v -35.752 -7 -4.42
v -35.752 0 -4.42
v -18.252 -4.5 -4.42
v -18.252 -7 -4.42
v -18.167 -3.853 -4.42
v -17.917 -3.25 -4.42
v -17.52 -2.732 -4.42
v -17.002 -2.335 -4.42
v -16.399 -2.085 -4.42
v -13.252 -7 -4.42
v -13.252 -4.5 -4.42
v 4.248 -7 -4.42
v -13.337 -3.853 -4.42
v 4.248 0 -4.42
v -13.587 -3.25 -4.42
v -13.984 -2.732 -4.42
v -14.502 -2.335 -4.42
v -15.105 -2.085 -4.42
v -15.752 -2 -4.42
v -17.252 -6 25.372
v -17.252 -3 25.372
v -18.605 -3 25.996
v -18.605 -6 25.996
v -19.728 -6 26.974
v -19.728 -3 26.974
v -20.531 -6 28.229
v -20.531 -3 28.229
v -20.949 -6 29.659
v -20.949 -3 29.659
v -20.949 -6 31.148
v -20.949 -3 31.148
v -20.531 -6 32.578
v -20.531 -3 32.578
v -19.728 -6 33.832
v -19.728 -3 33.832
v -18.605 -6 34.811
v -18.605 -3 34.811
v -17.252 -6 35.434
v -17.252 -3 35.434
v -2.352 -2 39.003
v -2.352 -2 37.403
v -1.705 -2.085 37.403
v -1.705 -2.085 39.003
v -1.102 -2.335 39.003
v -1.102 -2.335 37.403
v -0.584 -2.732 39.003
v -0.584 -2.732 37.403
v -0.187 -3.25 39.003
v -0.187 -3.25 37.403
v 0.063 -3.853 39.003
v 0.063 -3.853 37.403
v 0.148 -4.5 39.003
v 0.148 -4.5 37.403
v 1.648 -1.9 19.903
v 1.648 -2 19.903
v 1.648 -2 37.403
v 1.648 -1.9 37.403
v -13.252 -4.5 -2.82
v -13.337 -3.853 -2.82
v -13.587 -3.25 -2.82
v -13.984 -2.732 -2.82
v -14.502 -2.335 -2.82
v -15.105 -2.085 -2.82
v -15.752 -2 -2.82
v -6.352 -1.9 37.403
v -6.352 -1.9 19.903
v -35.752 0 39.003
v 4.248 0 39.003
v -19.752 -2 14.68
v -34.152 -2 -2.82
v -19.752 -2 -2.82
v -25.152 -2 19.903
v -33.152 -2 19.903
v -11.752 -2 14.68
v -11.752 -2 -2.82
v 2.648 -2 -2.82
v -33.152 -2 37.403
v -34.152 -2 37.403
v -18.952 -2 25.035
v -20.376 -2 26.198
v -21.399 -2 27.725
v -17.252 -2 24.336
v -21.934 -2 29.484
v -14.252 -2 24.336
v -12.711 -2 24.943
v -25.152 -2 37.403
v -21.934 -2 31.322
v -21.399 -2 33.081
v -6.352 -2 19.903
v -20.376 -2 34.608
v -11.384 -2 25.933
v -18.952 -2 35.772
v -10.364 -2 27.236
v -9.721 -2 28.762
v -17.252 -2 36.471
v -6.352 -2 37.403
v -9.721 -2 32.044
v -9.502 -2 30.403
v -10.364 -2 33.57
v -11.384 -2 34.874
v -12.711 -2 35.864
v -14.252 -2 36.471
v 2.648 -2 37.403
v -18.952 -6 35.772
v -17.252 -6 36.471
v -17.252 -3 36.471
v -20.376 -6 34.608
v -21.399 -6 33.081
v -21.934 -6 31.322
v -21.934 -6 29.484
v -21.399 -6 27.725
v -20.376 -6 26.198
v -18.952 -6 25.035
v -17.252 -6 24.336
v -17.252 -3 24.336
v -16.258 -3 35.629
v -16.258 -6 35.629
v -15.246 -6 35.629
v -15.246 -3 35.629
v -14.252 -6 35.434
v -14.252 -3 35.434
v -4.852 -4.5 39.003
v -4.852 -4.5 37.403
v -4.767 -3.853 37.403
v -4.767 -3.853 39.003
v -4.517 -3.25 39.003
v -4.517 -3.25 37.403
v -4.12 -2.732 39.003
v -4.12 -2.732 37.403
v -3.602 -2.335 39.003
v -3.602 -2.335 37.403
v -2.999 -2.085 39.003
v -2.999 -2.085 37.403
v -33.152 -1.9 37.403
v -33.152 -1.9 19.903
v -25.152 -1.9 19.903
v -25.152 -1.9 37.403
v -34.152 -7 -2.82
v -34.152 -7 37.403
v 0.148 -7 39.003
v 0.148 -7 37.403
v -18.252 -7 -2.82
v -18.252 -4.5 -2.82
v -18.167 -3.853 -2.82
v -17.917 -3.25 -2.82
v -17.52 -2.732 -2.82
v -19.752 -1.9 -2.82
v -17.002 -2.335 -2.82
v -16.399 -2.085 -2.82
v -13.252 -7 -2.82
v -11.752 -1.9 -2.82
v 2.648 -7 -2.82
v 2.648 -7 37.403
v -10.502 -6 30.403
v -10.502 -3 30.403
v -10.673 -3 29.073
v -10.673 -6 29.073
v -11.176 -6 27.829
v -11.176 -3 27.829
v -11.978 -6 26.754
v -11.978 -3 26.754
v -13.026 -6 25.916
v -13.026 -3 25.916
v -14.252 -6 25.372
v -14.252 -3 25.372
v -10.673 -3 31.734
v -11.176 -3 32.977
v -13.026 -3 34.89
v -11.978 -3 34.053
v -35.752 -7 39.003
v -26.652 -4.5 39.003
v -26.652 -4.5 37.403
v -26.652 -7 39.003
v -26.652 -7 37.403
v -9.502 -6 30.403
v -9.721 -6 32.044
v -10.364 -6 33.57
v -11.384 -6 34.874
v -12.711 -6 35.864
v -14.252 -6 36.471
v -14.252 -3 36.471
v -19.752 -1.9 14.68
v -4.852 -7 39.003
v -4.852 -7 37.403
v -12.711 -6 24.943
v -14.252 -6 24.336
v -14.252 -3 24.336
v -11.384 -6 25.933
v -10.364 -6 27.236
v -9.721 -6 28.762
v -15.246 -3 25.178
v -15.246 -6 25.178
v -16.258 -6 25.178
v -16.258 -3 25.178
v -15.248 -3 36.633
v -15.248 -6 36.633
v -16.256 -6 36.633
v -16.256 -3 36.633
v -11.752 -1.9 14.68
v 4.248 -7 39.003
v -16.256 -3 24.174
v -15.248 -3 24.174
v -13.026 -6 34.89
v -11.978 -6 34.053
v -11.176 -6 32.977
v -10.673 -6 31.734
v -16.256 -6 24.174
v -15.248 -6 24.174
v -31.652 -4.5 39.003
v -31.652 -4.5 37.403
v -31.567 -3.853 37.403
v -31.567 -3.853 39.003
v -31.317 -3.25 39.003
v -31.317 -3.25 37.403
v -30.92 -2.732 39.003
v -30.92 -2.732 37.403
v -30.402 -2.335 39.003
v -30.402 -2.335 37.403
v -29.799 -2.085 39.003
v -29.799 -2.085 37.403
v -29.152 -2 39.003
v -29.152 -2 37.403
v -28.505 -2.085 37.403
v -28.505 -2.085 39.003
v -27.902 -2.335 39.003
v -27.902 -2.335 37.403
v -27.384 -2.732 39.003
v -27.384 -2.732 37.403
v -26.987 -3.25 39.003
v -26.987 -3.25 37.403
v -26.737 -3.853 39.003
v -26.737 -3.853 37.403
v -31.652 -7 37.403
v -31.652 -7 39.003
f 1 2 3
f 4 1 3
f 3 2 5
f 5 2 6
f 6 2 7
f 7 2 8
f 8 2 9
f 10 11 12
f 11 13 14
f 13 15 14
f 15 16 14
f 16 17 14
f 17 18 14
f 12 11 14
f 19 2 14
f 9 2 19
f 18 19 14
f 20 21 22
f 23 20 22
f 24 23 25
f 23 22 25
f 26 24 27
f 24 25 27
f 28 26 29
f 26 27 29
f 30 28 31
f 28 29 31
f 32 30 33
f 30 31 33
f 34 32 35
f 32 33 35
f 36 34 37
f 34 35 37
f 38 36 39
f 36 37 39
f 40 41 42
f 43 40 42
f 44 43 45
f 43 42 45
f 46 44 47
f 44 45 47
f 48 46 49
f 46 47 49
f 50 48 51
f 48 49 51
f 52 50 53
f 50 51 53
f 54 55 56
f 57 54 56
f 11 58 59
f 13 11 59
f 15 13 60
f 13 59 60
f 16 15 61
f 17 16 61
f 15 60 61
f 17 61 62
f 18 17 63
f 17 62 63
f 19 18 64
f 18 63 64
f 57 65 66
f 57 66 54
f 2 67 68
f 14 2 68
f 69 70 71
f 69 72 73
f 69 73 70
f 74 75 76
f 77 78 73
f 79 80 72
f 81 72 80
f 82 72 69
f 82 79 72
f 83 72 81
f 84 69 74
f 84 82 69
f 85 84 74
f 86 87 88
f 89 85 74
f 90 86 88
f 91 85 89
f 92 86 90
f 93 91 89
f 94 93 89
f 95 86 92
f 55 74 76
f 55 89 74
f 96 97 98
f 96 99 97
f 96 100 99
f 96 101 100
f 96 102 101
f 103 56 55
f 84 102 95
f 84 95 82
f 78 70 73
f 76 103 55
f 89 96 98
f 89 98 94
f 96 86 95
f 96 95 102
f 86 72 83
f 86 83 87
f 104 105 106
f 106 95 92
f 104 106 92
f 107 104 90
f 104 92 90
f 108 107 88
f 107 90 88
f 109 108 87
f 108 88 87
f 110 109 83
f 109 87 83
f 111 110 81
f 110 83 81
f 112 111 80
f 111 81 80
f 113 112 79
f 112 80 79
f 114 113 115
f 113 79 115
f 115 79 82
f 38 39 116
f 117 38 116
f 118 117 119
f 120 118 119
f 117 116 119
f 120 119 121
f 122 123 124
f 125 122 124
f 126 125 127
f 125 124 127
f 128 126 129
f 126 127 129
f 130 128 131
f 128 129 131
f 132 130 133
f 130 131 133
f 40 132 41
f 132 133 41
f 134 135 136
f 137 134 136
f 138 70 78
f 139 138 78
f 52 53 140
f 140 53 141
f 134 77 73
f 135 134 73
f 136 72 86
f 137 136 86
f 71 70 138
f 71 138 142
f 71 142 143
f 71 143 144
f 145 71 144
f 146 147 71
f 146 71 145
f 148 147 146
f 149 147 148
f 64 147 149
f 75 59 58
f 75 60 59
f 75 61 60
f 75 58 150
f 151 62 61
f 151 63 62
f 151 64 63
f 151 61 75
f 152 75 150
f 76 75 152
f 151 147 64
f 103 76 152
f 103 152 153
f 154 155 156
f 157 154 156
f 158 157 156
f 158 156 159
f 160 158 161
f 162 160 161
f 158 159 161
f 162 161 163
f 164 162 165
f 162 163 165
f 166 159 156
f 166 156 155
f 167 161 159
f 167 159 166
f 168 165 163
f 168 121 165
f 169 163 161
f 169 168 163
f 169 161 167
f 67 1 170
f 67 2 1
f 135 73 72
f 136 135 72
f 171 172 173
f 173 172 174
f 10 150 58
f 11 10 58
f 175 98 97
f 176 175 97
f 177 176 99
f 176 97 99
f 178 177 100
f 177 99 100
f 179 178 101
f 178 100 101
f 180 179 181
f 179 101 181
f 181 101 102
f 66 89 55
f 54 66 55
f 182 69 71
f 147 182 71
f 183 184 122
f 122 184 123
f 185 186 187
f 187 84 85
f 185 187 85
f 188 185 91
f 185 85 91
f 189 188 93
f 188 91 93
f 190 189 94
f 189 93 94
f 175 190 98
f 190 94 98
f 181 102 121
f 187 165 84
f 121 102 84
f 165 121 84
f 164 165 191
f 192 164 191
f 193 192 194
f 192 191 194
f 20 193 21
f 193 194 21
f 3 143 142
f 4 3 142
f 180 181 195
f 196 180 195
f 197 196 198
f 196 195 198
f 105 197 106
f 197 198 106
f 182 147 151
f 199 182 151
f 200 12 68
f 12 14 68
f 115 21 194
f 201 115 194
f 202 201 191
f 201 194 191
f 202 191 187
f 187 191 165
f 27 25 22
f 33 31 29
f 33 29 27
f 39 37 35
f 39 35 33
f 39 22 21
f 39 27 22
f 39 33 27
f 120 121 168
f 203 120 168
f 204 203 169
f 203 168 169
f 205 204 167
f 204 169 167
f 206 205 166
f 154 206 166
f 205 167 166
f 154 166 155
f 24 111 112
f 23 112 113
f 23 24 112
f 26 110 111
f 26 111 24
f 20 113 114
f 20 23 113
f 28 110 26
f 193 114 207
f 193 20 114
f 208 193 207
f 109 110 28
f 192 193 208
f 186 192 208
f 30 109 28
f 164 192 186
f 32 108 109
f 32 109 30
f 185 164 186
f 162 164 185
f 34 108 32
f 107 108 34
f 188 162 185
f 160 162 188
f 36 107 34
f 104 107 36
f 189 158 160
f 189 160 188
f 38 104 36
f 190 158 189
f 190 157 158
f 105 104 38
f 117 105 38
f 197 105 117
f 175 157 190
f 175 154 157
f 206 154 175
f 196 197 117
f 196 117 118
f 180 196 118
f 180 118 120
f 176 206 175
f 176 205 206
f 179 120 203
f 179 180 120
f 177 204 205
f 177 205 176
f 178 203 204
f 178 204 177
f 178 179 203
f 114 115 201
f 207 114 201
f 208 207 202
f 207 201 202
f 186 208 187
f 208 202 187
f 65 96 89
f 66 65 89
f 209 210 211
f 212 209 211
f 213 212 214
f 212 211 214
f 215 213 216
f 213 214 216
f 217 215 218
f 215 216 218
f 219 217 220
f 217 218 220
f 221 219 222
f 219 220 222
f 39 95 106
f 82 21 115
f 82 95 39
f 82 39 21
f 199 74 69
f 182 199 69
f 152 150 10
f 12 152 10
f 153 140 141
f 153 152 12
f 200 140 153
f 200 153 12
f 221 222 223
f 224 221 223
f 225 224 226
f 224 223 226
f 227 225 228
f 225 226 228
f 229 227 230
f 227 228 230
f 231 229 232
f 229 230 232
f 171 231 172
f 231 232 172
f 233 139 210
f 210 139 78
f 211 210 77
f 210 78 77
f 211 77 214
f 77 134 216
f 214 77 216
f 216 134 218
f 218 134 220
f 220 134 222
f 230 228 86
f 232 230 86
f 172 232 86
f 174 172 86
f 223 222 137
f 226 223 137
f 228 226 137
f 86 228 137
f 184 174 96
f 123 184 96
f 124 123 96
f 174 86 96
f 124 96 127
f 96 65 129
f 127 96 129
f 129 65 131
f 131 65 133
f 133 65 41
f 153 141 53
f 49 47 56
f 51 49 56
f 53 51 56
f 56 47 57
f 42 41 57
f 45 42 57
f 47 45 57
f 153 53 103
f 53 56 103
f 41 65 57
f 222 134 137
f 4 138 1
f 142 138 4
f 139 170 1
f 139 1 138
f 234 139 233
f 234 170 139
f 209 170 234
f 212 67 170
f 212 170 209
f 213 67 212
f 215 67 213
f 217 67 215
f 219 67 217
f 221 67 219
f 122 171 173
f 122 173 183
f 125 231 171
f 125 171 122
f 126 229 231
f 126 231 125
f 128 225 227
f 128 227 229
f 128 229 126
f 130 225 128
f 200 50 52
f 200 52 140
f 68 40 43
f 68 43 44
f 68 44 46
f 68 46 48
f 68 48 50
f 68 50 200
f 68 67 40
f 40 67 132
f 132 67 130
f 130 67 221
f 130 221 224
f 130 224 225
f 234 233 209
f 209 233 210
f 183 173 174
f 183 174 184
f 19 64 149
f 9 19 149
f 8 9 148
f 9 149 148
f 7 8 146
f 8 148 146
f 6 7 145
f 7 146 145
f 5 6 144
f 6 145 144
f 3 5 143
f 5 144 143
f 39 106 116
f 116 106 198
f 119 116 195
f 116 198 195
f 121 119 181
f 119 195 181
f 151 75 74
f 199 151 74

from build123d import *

# Parameters (mm, degrees)
F0_W      = 40
F0_H      = 43.4234265382
F1_DEPTH  = 2
F2_W      = 40
F2_H      = 43.4234265382
F2_W_2    = 36.8
F2_H_2    = 40.2234265382
F3_DEPTH  = 5
F5_DEPTH  = 1.6
F7_DEPTH  = 1
F8_DEPTH  = 4
F9_DEPTH  = 1
F11_DEPTH = 1.6
F13_DEPTH = 0.1


with BuildPart() as f1:
    # F0 (on Front) → F1 (new body)
    with BuildSketch(Plane.XZ):
        with Locations((-15.7519546337, 17.2915523872)):
            Rectangle(F0_W, F0_H)
    extrude(amount=F1_DEPTH)

    # F2 (on face) → F3 (join)
    with BuildSketch(Plane.XZ.offset(2)):
        with Locations((-15.7519546337, 17.2915523872)):
            Rectangle(F2_W, F2_H)
        with Locations((-15.7519546337, 17.2915523872)):
            Rectangle(F2_W_2, F2_H_2, mode=Mode.SUBTRACT)
    extrude(amount=F3_DEPTH)

    # F4 (on face) → F5 (cut, through all)
    with BuildSketch(Plane(origin=(0, 0, 37.4032656563), x_dir=(1, 0, 0), z_dir=(0, 0, -1))):
        with BuildLine():
            ThreePointArc((-4.8519546337, 4.5), (-4.1197215867, 2.732233047), (-2.3519546337, 2))
            ThreePointArc((-2.3519546337, 2), (-0.5841876808, 2.732233047), (0.1480453663, 4.5))
            ThreePointArc((0.1480453663, 4.5), (-0.5841876808, 6.267766953), (-2.3519546337, 7))
            ThreePointArc((-2.3519546337, 7), (-4.1197215867, 6.267766953), (-4.8519546337, 4.5))
        make_face()
        with BuildLine():
            ThreePointArc((-29.1519546337, 2), (-27.3841876808, 2.732233047), (-26.6519546337, 4.5))
            ThreePointArc((-26.6519546337, 4.5), (-27.3841876808, 6.267766953), (-29.1519546337, 7))
            ThreePointArc((-29.1519546337, 7), (-30.9197215867, 6.267766953), (-31.6519546337, 4.5))
            ThreePointArc((-31.6519546337, 4.5), (-30.9197215867, 2.732233047), (-29.1519546337, 2))
        make_face()
        with BuildLine():
            ThreePointArc((-29.1519546337, 7), (-27.3841876808, 6.267766953), (-26.6519546337, 4.5))
            Line((-26.6519546337, 4.5), (-26.6519546337, 7))
            Line((-26.6519546337, 7), (-29.1519546337, 7))
        make_face()
        with BuildLine():
            ThreePointArc((-31.6519546337, 4.5), (-30.9197215867, 6.267766953), (-29.1519546337, 7))
            Line((-29.1519546337, 7), (-31.6519546337, 7))
            Line((-31.6519546337, 7), (-31.6519546337, 4.5))
        make_face()
        with BuildLine():
            Line((-2.3519546337, 7), (-4.8519546337, 7))
            Line((-4.8519546337, 7), (-4.8519546337, 4.5))
            ThreePointArc((-4.8519546337, 4.5), (-4.1197215867, 6.267766953), (-2.3519546337, 7))
        make_face()
        with BuildLine():
            ThreePointArc((-2.3519546337, 7), (-0.5841876808, 6.267766953), (0.1480453663, 4.5))
            Line((0.1480453663, 4.5), (0.1480453663, 7))
            Line((0.1480453663, 7), (-2.3519546337, 7))
        make_face()
    extrude(amount=-F5_DEPTH, mode=Mode.SUBTRACT)

    # F6 (on face) → F7 (join)
    with BuildSketch(Plane.XZ.offset(2)):
        with BuildLine():
            Line((-17.2519546337, 25.3721127069), (-17.2519546337, 35.4344186057))
            ThreePointArc((-17.2519546337, 35.4344186057), (-21.0019546337, 30.4032656563), (-17.2519546337, 25.3721127069))
        make_face()
        with BuildLine():
            ThreePointArc((-14.2519546337, 25.3721127069), (-11.5425900736, 27.2657905568), (-10.5019546337, 30.4032656563))
            ThreePointArc((-10.5019546337, 30.4032656563), (-11.5425900736, 33.5407407558), (-14.2519546337, 35.4344186057))
            Line((-14.2519546337, 35.4344186057), (-14.2519546337, 25.3721127069))
        make_face()
    extrude(amount=F7_DEPTH)

    # F6 (on face) → F8 (join)
    with BuildSketch(Plane.XZ.offset(2)):
        with BuildLine():
            ThreePointArc((-14.2519546337, 35.4344186057), (-11.5425900736, 33.5407407558), (-10.5019546337, 30.4032656563))
            ThreePointArc((-10.5019546337, 30.4032656563), (-11.5425900736, 27.2657905568), (-14.2519546337, 25.3721127069))
            Line((-14.2519546337, 25.3721127069), (-14.2519546337, 24.3359351065))
            ThreePointArc((-14.2519546337, 24.3359351065), (-10.8306997125, 26.5505069044), (-9.5019546337, 30.4032656563))
            ThreePointArc((-9.5019546337, 30.4032656563), (-10.8306997125, 34.2560244081), (-14.2519546337, 36.470596206))
            Line((-14.2519546337, 36.470596206), (-14.2519546337, 35.4344186057))
        make_face()
        with BuildLine():
            ThreePointArc((-17.2519546337, 35.4344186057), (-15.7519546337, 35.6532656563), (-14.2519546337, 35.4344186057))
            Line((-14.2519546337, 35.4344186057), (-14.2519546337, 36.470596206))
            ThreePointArc((-14.2519546337, 36.470596206), (-15.7519546337, 36.6532656563), (-17.2519546337, 36.470596206))
            Line((-17.2519546337, 36.470596206), (-17.2519546337, 35.4344186057))
        make_face()
        with BuildLine():
            Line((-14.2519546337, 24.3359351065), (-14.2519546337, 25.3721127069))
            ThreePointArc((-14.2519546337, 25.3721127069), (-15.7519546337, 25.1532656563), (-17.2519546337, 25.3721127069))
            Line((-17.2519546337, 25.3721127069), (-17.2519546337, 24.3359351065))
            ThreePointArc((-17.2519546337, 24.3359351065), (-15.7519546337, 24.1532656563), (-14.2519546337, 24.3359351065))
        make_face()
        with BuildLine():
            ThreePointArc((-17.2519546337, 25.3721127069), (-21.0019546337, 30.4032656563), (-17.2519546337, 35.4344186057))
            Line((-17.2519546337, 35.4344186057), (-17.2519546337, 36.470596206))
            ThreePointArc((-17.2519546337, 36.470596206), (-22.0019546337, 30.4032656563), (-17.2519546337, 24.3359351065))
            Line((-17.2519546337, 24.3359351065), (-17.2519546337, 25.3721127069))
        make_face()
    extrude(amount=F8_DEPTH)

    # F6 (on face) → F9 (cut)
    with BuildSketch(Plane.XZ.offset(2)):
        with BuildLine():
            ThreePointArc((-17.2519546337, 35.4344186057), (-15.7519546337, 35.6532656563), (-14.2519546337, 35.4344186057))
            Line((-14.2519546337, 35.4344186057), (-14.2519546337, 36.470596206))
            ThreePointArc((-14.2519546337, 36.470596206), (-15.7519546337, 36.6532656563), (-17.2519546337, 36.470596206))
            Line((-17.2519546337, 36.470596206), (-17.2519546337, 35.4344186057))
        make_face()
        with BuildLine():
            Line((-14.2519546337, 24.3359351065), (-14.2519546337, 25.3721127069))
            ThreePointArc((-14.2519546337, 25.3721127069), (-15.7519546337, 25.1532656563), (-17.2519546337, 25.3721127069))
            Line((-17.2519546337, 25.3721127069), (-17.2519546337, 24.3359351065))
            ThreePointArc((-17.2519546337, 24.3359351065), (-15.7519546337, 24.1532656563), (-14.2519546337, 24.3359351065))
        make_face()
    extrude(amount=F9_DEPTH, mode=Mode.SUBTRACT)

    # F10 (on face) → F11 (cut, through all)
    with BuildSketch(Plane.XY.offset(-2.8201608819)):
        with BuildLine():
            Line((-13.2519546337, -7), (-13.2519546337, -4.5))
            ThreePointArc((-13.2519546337, -4.5), (-13.9841876808, -6.267766953), (-15.7519546337, -7))
            Line((-15.7519546337, -7), (-13.2519546337, -7))
        make_face()
        with BuildLine():
            ThreePointArc((-15.7519546337, -7), (-13.9841876808, -6.267766953), (-13.2519546337, -4.5))
            ThreePointArc((-13.2519546337, -4.5), (-13.984187679, -2.7322330488), (-15.7519546286, -2))
            ThreePointArc((-15.7519546286, -2), (-17.5197215849, -2.7322330452), (-18.2519546337, -4.5))
            ThreePointArc((-18.2519546337, -4.5), (-17.5197215867, -6.267766953), (-15.7519546337, -7))
        make_face()
        with BuildLine():
            Line((-18.2519546337, -7), (-15.7519546337, -7))
            ThreePointArc((-15.7519546337, -7), (-17.5197215867, -6.267766953), (-18.2519546337, -4.5))
            Line((-18.2519546337, -4.5), (-18.2519546337, -7))
        make_face()
    extrude(amount=-F11_DEPTH, mode=Mode.SUBTRACT)

    # F12 (on face) → F13 (cut)
    with BuildSketch(Plane.XZ.offset(2)):
        Polygon((-29.1519546337, 37.4032656563), (-33.1519546337, 37.4032656563), (-33.1519546337, 19.9032656563), (-25.1519546337, 19.9032656563), (-25.1519546337, 37.4032656563), align=None)
        Polygon((-2.3519546468, 37.4032656563), (-6.3519546337, 37.4032656563), (-6.3519546337, 19.9032656563), (1.6480453663, 19.9032656563), (1.6480453663, 37.4032656563), align=None)
        Polygon((-19.7519546337, 14.6798391181), (-19.7519546337, -2.8201608819), (-15.7519546337, -2.8201608819), (-11.7519546337, -2.8201608819), (-11.7519546337, 14.6798391181), align=None)
    extrude(amount=-F13_DEPTH, mode=Mode.SUBTRACT)


solid = f1.part
